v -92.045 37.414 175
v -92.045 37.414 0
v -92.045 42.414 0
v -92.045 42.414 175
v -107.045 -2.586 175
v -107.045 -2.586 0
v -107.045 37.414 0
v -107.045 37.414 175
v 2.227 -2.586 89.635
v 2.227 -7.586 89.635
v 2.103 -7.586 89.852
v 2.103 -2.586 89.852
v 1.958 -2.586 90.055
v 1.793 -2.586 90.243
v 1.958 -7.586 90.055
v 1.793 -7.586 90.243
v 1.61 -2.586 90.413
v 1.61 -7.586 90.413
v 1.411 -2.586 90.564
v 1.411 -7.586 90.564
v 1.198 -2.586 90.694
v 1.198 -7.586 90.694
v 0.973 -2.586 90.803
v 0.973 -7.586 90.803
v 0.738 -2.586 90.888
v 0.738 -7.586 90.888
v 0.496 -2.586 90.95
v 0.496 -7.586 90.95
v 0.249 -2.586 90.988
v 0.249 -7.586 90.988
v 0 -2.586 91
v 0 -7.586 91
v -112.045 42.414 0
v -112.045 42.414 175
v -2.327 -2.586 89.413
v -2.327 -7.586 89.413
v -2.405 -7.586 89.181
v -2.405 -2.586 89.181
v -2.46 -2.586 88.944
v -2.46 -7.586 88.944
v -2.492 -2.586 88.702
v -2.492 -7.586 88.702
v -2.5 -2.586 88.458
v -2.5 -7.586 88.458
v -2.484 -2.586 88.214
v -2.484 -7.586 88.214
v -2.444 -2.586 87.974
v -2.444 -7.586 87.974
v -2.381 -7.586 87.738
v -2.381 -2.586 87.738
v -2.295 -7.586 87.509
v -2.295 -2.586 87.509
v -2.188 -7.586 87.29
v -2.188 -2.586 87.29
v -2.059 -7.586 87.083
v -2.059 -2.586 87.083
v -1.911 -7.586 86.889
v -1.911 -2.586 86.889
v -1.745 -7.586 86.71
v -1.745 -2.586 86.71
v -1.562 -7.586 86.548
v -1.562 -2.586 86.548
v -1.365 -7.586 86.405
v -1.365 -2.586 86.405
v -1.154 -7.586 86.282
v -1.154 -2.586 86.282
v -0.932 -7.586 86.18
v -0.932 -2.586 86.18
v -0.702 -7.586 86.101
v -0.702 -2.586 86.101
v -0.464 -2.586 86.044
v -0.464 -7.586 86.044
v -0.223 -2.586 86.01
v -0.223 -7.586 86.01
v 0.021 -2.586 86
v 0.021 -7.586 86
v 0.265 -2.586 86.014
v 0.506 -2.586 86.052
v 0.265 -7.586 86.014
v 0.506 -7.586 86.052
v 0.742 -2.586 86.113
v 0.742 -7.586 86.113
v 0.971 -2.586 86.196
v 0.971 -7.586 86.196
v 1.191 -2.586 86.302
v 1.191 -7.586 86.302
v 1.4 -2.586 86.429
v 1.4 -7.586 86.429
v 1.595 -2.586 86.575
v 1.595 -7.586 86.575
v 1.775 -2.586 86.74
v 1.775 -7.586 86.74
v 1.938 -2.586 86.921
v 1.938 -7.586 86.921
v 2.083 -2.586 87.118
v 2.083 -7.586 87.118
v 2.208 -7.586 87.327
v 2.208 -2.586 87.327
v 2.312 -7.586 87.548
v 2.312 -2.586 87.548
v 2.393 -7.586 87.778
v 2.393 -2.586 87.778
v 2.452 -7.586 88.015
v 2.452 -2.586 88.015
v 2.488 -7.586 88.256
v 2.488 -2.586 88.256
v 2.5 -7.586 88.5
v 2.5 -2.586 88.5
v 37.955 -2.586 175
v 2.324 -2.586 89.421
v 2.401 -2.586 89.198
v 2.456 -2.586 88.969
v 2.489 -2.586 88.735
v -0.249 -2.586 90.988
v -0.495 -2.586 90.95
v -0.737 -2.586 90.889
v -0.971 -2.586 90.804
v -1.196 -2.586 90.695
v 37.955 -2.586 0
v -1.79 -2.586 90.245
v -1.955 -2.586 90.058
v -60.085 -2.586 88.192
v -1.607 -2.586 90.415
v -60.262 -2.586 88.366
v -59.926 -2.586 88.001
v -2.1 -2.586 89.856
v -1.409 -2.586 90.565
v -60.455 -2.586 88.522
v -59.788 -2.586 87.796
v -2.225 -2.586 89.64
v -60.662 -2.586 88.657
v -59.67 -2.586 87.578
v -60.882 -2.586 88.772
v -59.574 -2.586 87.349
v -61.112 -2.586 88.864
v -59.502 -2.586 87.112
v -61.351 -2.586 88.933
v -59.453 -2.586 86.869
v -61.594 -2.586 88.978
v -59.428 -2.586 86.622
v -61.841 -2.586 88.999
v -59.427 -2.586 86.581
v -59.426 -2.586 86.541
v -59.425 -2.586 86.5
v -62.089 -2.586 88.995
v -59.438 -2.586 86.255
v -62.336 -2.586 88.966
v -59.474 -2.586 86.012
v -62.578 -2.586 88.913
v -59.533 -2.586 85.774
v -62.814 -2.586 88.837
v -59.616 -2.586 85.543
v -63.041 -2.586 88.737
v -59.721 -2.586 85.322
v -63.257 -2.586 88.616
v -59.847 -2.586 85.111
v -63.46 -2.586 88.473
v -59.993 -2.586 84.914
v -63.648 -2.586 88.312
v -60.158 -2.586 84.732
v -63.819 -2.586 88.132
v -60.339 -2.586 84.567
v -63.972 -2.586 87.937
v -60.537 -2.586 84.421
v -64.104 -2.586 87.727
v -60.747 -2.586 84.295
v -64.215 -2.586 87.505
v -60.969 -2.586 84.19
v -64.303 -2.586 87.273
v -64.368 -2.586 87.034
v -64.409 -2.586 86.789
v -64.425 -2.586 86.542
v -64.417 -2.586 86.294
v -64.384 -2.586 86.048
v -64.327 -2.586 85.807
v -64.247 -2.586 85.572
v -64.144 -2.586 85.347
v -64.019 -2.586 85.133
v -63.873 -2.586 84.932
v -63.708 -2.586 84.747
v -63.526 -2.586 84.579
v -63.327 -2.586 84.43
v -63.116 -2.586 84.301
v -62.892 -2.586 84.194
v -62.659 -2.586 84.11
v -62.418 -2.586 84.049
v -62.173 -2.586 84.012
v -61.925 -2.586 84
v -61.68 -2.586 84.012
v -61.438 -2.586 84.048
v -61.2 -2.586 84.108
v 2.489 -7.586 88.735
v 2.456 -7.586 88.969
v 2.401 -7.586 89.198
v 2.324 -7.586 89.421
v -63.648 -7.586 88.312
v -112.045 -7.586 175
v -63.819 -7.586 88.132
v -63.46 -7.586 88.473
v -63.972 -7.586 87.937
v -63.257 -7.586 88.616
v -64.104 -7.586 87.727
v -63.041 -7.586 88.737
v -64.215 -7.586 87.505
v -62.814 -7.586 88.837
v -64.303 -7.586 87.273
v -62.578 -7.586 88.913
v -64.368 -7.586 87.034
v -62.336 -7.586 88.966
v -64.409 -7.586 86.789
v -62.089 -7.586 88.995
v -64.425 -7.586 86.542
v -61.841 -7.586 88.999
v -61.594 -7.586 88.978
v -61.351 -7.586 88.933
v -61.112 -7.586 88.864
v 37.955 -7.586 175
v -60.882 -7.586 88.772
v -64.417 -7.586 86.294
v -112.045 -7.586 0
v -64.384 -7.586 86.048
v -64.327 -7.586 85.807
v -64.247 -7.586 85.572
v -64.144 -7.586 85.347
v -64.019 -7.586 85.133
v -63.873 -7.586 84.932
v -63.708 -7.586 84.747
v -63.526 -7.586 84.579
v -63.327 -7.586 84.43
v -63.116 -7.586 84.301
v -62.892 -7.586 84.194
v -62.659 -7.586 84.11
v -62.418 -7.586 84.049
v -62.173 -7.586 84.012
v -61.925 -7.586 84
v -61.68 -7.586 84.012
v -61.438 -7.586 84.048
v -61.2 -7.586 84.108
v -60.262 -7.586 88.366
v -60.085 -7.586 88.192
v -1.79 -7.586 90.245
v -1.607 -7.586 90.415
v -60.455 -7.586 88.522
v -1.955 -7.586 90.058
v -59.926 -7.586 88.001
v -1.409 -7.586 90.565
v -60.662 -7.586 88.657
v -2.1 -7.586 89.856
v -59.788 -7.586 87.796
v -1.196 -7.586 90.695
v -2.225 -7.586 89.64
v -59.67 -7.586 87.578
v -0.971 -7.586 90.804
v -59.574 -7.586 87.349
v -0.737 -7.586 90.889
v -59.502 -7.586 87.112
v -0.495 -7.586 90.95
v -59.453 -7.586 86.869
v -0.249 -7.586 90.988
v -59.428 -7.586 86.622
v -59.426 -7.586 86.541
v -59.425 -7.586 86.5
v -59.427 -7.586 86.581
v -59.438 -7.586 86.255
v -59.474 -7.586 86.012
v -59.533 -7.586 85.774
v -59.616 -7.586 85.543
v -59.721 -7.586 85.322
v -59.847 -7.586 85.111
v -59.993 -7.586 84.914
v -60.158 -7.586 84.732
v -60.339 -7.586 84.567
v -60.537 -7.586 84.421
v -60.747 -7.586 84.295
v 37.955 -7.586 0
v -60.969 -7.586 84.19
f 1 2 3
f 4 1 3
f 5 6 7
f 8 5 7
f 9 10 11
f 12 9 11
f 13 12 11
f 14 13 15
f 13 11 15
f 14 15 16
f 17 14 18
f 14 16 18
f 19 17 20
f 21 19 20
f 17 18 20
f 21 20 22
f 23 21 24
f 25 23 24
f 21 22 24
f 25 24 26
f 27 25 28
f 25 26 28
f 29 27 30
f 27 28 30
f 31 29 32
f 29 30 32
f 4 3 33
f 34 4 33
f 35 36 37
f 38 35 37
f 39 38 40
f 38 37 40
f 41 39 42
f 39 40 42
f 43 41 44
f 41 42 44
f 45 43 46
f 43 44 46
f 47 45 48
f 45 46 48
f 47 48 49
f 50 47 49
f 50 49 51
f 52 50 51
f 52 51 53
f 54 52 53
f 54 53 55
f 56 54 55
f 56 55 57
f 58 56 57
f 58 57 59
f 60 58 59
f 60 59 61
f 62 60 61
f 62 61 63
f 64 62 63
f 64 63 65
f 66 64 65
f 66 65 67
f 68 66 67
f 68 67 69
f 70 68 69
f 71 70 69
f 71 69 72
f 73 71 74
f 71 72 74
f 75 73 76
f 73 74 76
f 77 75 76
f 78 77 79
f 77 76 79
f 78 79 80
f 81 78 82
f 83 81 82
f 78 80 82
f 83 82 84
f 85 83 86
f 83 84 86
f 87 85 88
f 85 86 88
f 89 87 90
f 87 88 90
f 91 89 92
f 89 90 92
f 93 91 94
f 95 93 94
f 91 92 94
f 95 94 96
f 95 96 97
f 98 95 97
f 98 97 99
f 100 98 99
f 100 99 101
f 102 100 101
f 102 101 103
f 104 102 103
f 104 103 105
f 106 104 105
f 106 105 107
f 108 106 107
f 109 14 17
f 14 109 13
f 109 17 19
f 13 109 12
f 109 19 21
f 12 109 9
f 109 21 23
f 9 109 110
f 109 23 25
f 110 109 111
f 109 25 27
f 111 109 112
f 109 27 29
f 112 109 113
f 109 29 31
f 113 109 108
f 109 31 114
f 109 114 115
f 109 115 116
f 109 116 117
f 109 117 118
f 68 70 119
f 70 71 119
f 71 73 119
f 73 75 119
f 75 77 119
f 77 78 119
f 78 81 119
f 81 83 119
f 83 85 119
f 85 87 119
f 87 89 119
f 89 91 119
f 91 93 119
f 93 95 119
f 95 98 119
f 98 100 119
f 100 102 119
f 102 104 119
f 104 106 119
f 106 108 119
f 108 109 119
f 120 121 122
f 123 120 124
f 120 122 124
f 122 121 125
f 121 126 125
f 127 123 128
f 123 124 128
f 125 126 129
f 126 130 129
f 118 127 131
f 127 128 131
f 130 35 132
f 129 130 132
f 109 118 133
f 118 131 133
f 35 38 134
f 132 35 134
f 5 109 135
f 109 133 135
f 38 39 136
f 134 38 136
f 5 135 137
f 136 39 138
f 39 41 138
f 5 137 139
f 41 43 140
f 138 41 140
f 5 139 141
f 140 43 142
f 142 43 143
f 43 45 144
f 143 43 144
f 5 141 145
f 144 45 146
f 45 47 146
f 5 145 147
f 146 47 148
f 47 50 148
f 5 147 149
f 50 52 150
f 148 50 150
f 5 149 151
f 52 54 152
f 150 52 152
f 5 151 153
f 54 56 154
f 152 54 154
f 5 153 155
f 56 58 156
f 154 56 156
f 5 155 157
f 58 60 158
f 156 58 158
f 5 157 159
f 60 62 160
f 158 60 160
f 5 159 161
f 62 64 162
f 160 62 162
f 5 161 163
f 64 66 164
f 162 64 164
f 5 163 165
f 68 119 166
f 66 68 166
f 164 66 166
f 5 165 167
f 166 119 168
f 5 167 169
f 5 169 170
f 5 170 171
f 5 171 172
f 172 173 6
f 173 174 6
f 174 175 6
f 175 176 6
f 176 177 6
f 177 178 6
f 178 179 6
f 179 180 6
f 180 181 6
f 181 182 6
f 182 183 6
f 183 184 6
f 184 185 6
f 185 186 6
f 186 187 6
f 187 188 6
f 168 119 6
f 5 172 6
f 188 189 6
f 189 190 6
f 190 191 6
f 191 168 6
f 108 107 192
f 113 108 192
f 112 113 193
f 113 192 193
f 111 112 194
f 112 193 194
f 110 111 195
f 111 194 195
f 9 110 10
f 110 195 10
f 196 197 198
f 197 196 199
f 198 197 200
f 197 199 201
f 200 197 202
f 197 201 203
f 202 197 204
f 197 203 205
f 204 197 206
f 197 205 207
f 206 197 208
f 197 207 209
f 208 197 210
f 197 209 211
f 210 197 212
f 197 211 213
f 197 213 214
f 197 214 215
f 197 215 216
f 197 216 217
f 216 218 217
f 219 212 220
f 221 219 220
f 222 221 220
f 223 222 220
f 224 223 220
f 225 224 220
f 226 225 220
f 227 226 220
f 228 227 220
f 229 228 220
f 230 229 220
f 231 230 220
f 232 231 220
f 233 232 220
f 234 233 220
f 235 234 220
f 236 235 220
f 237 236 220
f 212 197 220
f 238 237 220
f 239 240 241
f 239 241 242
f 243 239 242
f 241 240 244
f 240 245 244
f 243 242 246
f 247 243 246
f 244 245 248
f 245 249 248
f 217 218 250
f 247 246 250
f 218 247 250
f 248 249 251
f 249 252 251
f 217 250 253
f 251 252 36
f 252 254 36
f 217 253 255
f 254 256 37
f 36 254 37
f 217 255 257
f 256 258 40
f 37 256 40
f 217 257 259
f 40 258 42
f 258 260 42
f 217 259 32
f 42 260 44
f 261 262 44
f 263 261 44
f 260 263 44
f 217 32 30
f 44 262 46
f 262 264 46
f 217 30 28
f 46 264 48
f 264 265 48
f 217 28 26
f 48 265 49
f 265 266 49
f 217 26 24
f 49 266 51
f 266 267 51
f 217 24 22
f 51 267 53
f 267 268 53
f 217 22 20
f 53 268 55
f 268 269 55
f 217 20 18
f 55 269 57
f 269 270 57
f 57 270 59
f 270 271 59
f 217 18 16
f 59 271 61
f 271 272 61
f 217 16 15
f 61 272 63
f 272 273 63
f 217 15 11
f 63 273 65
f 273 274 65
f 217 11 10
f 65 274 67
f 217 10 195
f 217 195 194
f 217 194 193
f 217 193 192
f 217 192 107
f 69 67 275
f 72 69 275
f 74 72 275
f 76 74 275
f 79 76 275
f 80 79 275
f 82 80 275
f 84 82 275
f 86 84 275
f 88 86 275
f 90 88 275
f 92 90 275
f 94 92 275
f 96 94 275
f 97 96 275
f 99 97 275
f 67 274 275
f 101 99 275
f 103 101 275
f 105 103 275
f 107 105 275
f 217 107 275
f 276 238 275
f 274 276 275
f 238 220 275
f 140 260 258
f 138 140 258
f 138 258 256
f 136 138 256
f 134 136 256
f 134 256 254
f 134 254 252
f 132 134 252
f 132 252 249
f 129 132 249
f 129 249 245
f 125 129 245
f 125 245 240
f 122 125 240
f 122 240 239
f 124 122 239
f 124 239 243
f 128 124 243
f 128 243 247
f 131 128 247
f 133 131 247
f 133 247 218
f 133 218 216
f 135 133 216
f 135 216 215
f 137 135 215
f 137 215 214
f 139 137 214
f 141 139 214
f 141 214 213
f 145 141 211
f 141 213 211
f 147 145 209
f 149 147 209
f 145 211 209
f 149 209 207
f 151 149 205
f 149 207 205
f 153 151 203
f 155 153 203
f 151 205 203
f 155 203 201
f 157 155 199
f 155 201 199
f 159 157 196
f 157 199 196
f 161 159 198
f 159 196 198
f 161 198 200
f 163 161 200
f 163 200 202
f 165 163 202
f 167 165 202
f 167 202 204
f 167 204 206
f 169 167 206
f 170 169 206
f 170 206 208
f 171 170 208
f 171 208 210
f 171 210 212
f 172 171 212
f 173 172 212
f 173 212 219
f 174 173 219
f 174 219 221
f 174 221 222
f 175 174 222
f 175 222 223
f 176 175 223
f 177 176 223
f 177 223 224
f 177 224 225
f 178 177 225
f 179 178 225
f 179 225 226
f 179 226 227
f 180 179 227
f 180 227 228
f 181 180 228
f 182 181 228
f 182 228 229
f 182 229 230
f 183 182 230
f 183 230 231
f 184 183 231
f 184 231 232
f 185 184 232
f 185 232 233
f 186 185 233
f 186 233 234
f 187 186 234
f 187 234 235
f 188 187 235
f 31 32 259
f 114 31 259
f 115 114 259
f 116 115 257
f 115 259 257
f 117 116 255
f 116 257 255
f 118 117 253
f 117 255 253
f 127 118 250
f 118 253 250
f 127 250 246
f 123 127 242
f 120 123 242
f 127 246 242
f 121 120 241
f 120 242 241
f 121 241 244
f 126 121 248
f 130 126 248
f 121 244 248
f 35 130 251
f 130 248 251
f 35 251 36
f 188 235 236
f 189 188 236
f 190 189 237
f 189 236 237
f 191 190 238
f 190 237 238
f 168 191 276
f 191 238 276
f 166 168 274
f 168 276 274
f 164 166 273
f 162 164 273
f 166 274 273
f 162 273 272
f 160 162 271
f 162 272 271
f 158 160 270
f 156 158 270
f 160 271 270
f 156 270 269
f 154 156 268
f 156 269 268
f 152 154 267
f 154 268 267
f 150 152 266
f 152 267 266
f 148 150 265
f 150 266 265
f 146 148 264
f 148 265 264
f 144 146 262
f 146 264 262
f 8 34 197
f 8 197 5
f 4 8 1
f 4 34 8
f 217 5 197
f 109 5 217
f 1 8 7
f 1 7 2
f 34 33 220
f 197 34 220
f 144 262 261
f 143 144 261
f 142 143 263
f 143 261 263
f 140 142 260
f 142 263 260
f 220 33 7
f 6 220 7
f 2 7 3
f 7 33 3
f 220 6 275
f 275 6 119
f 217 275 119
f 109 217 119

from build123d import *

# Parameters (mm, degrees)
F1_DEPTH = 175
F3_DEPTH = 25
F4_DEPTH = 25


with BuildPart() as f1:
    # F0 (on Top) → F1 (new body)
    with BuildSketch(Plane.XY):
        Polygon((-112.044677, 17.414129), (-112.044677, -7.585871), (37.955323, -7.585871), (37.955323, -2.585871), (-107.044677, -2.585871), (-107.044677, 17.414129), align=None)
        Polygon((-112.044677, 42.414129), (-112.044677, 17.414129), (-107.044677, 17.414129), (-107.044677, 37.414129), (-92.044677, 37.414129), (-92.044677, 42.414129), align=None)
    extrude(amount=F1_DEPTH)

    # F2 (on face) → F3 (cut)
    with BuildSketch(Plane.XZ.offset(7.585871)):
        with BuildLine():
            ThreePointArc((-2.327439, 89.412704), (-0.464437, 86.043519), (2.5, 88.5))
            Line((2.5, 88.5), (0, 88.5))
            Line((0, 88.5), (0, 89.526452))
            Line((0, 89.526452), (-2.327439, 89.412704))
        make_face()
    extrude(amount=-F3_DEPTH, mode=Mode.SUBTRACT)

    # F2 (on face) → F4 (cut)
    with BuildSketch(Plane.XZ.offset(7.585871)):
        with BuildLine():
            Line((0, 88.5), (2.5, 88.5))
            ThreePointArc((2.5, 88.5), (2.430881, 89.083794), (2.227347, 89.635308))
            Line((2.227347, 89.635308), (0, 89.526452))
            Line((0, 89.526452), (0, 88.5))
        make_face()
        with BuildLine():
            ThreePointArc((-59.425465, 86.5), (-59.42621, 86.561036), (-59.428445, 86.622036))
            Line((-59.428445, 86.622036), (-61.925465, 86.5))
            Line((-61.925465, 86.5), (-61.925465, 84))
            ThreePointArc((-61.925465, 84), (-60.157698, 84.732233), (-59.425465, 86.5))
        make_face()
        with BuildLine():
            Line((-61.925465, 86.5), (-59.428445, 86.622036))
            ThreePointArc((-59.428445, 86.622036), (-63.735864, 88.224081), (-61.925465, 84))
            Line((-61.925465, 84), (-61.925465, 86.5))
        make_face()
        with BuildLine():
            ThreePointArc((-2.327439, 89.412704), (-0.464437, 86.043519), (2.5, 88.5))
            Line((2.5, 88.5), (0, 88.5))
            Line((0, 88.5), (0, 89.526452))
            Line((0, 89.526452), (-2.327439, 89.412704))
        make_face()
        with BuildLine():
            Line((0, 89.526452), (2.227347, 89.635308))
            ThreePointArc((2.227347, 89.635308), (1.306088, 90.631698), (0, 91))
            Line((0, 91), (0, 89.526452))
        make_face()
        with BuildLine():
            ThreePointArc((0, 91), (-1.408588, 90.565401), (-2.327439, 89.412704))
            Line((-2.327439, 89.412704), (0, 89.526452))
            Line((0, 89.526452), (0, 91))
        make_face()
    extrude(amount=-F4_DEPTH, mode=Mode.SUBTRACT)


solid = f1.part
